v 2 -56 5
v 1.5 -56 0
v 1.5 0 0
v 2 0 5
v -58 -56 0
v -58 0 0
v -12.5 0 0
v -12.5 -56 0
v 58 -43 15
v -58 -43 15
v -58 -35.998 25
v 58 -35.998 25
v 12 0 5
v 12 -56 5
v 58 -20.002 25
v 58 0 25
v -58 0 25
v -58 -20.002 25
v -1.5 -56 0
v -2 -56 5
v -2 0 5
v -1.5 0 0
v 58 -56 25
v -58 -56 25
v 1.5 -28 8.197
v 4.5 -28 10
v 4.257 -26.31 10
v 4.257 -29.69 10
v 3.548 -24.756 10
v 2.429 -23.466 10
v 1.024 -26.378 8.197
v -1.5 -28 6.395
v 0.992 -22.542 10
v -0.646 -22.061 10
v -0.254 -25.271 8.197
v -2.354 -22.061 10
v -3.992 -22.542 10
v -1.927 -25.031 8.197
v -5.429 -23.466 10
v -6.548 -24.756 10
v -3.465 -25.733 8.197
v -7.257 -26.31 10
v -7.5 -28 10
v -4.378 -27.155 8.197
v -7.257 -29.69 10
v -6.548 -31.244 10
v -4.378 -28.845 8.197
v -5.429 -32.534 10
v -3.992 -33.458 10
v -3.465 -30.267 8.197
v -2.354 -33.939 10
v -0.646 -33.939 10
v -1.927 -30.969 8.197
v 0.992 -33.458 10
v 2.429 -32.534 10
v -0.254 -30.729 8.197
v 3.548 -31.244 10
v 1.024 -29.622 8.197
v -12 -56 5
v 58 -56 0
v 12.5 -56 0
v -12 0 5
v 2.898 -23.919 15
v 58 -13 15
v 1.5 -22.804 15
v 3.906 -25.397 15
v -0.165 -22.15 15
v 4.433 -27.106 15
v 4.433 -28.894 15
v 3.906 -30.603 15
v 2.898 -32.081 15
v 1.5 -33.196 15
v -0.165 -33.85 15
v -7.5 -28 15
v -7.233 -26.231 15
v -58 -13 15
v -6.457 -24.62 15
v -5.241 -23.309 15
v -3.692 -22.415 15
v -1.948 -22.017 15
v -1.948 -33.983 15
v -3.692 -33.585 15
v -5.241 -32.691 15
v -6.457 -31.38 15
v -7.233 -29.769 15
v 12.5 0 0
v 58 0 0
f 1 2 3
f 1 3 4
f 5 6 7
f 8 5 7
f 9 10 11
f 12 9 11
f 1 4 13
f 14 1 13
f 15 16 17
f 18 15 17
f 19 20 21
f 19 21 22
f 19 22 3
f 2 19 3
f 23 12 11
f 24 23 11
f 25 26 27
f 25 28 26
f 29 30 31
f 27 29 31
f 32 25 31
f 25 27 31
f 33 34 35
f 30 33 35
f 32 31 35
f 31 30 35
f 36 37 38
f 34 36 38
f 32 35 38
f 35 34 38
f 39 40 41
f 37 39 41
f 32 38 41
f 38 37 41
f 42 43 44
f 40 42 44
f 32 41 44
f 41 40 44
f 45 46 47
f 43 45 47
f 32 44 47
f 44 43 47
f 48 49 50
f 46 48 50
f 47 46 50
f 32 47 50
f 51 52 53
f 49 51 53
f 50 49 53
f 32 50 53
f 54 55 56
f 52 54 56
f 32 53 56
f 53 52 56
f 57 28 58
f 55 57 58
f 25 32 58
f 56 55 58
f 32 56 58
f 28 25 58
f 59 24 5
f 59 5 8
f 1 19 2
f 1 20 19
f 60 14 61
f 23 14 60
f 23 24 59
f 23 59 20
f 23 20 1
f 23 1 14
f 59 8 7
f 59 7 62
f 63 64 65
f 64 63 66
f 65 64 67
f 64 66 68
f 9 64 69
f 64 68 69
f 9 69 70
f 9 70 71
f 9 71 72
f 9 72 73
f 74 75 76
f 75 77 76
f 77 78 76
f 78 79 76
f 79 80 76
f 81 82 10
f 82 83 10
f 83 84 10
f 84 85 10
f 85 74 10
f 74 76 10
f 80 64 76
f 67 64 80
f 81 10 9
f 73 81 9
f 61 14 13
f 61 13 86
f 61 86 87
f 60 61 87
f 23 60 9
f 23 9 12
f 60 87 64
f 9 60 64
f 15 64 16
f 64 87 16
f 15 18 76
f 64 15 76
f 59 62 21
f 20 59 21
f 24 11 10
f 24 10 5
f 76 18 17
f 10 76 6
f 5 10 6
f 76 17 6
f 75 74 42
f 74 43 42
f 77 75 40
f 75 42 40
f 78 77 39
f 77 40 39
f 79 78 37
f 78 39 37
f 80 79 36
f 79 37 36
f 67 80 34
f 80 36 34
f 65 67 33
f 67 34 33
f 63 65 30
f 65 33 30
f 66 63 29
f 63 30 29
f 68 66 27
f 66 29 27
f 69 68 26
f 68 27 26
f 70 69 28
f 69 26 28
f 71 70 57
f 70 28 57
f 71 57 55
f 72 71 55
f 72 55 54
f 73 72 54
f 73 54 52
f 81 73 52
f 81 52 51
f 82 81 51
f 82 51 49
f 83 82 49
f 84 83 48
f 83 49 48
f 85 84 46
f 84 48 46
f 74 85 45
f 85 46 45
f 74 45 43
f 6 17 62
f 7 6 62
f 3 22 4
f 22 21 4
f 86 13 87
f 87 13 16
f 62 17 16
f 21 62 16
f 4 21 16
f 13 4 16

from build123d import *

# Parameters (mm, degrees)
F1_DEPTH = 56
F3_DEPTH = 116
F5_D     = 12
F5_DEPTH = 5
F5_TIP   = 3.6051637142


with BuildPart() as f1:
    # F0 (on Front) → F1 (new body)
    with BuildSketch(Plane.XZ):
        Polygon((-1.5, 0), (0, 0), (1.5, 0), (2, 5), (12, 5), (12.5, 0), (58, 0), (58, 25), (-58, 25), (-58, 0), (-12.5, 0), (-12, 5), (-2, 5), align=None)
    extrude(amount=F1_DEPTH)

    # F2 (on face) → F3 (cut, through all)
    with BuildSketch(Plane(origin=(-58, 0, 0), x_dir=(0, -1, 0), z_dir=(-1, 0, 0))):
        Polygon((28, 25), (20.0020753821, 25), (13, 15), (28, 15), align=None)
        Polygon((35.9979246179, 25), (28, 25), (28, 15), (43, 15), align=None)
    extrude(amount=-F3_DEPTH, mode=Mode.SUBTRACT)

    # F5
    with Locations(Plane.XY.offset(15)):
        with Locations((-1.5, -28)):
            Hole(F5_D / 2, depth=F5_DEPTH)
            with Locations((0, 0, -(F5_DEPTH + F5_TIP / 2))):  # 118° drill point
                Cone(0, F5_D / 2, F5_TIP, mode=Mode.SUBTRACT)


solid = f1.part
